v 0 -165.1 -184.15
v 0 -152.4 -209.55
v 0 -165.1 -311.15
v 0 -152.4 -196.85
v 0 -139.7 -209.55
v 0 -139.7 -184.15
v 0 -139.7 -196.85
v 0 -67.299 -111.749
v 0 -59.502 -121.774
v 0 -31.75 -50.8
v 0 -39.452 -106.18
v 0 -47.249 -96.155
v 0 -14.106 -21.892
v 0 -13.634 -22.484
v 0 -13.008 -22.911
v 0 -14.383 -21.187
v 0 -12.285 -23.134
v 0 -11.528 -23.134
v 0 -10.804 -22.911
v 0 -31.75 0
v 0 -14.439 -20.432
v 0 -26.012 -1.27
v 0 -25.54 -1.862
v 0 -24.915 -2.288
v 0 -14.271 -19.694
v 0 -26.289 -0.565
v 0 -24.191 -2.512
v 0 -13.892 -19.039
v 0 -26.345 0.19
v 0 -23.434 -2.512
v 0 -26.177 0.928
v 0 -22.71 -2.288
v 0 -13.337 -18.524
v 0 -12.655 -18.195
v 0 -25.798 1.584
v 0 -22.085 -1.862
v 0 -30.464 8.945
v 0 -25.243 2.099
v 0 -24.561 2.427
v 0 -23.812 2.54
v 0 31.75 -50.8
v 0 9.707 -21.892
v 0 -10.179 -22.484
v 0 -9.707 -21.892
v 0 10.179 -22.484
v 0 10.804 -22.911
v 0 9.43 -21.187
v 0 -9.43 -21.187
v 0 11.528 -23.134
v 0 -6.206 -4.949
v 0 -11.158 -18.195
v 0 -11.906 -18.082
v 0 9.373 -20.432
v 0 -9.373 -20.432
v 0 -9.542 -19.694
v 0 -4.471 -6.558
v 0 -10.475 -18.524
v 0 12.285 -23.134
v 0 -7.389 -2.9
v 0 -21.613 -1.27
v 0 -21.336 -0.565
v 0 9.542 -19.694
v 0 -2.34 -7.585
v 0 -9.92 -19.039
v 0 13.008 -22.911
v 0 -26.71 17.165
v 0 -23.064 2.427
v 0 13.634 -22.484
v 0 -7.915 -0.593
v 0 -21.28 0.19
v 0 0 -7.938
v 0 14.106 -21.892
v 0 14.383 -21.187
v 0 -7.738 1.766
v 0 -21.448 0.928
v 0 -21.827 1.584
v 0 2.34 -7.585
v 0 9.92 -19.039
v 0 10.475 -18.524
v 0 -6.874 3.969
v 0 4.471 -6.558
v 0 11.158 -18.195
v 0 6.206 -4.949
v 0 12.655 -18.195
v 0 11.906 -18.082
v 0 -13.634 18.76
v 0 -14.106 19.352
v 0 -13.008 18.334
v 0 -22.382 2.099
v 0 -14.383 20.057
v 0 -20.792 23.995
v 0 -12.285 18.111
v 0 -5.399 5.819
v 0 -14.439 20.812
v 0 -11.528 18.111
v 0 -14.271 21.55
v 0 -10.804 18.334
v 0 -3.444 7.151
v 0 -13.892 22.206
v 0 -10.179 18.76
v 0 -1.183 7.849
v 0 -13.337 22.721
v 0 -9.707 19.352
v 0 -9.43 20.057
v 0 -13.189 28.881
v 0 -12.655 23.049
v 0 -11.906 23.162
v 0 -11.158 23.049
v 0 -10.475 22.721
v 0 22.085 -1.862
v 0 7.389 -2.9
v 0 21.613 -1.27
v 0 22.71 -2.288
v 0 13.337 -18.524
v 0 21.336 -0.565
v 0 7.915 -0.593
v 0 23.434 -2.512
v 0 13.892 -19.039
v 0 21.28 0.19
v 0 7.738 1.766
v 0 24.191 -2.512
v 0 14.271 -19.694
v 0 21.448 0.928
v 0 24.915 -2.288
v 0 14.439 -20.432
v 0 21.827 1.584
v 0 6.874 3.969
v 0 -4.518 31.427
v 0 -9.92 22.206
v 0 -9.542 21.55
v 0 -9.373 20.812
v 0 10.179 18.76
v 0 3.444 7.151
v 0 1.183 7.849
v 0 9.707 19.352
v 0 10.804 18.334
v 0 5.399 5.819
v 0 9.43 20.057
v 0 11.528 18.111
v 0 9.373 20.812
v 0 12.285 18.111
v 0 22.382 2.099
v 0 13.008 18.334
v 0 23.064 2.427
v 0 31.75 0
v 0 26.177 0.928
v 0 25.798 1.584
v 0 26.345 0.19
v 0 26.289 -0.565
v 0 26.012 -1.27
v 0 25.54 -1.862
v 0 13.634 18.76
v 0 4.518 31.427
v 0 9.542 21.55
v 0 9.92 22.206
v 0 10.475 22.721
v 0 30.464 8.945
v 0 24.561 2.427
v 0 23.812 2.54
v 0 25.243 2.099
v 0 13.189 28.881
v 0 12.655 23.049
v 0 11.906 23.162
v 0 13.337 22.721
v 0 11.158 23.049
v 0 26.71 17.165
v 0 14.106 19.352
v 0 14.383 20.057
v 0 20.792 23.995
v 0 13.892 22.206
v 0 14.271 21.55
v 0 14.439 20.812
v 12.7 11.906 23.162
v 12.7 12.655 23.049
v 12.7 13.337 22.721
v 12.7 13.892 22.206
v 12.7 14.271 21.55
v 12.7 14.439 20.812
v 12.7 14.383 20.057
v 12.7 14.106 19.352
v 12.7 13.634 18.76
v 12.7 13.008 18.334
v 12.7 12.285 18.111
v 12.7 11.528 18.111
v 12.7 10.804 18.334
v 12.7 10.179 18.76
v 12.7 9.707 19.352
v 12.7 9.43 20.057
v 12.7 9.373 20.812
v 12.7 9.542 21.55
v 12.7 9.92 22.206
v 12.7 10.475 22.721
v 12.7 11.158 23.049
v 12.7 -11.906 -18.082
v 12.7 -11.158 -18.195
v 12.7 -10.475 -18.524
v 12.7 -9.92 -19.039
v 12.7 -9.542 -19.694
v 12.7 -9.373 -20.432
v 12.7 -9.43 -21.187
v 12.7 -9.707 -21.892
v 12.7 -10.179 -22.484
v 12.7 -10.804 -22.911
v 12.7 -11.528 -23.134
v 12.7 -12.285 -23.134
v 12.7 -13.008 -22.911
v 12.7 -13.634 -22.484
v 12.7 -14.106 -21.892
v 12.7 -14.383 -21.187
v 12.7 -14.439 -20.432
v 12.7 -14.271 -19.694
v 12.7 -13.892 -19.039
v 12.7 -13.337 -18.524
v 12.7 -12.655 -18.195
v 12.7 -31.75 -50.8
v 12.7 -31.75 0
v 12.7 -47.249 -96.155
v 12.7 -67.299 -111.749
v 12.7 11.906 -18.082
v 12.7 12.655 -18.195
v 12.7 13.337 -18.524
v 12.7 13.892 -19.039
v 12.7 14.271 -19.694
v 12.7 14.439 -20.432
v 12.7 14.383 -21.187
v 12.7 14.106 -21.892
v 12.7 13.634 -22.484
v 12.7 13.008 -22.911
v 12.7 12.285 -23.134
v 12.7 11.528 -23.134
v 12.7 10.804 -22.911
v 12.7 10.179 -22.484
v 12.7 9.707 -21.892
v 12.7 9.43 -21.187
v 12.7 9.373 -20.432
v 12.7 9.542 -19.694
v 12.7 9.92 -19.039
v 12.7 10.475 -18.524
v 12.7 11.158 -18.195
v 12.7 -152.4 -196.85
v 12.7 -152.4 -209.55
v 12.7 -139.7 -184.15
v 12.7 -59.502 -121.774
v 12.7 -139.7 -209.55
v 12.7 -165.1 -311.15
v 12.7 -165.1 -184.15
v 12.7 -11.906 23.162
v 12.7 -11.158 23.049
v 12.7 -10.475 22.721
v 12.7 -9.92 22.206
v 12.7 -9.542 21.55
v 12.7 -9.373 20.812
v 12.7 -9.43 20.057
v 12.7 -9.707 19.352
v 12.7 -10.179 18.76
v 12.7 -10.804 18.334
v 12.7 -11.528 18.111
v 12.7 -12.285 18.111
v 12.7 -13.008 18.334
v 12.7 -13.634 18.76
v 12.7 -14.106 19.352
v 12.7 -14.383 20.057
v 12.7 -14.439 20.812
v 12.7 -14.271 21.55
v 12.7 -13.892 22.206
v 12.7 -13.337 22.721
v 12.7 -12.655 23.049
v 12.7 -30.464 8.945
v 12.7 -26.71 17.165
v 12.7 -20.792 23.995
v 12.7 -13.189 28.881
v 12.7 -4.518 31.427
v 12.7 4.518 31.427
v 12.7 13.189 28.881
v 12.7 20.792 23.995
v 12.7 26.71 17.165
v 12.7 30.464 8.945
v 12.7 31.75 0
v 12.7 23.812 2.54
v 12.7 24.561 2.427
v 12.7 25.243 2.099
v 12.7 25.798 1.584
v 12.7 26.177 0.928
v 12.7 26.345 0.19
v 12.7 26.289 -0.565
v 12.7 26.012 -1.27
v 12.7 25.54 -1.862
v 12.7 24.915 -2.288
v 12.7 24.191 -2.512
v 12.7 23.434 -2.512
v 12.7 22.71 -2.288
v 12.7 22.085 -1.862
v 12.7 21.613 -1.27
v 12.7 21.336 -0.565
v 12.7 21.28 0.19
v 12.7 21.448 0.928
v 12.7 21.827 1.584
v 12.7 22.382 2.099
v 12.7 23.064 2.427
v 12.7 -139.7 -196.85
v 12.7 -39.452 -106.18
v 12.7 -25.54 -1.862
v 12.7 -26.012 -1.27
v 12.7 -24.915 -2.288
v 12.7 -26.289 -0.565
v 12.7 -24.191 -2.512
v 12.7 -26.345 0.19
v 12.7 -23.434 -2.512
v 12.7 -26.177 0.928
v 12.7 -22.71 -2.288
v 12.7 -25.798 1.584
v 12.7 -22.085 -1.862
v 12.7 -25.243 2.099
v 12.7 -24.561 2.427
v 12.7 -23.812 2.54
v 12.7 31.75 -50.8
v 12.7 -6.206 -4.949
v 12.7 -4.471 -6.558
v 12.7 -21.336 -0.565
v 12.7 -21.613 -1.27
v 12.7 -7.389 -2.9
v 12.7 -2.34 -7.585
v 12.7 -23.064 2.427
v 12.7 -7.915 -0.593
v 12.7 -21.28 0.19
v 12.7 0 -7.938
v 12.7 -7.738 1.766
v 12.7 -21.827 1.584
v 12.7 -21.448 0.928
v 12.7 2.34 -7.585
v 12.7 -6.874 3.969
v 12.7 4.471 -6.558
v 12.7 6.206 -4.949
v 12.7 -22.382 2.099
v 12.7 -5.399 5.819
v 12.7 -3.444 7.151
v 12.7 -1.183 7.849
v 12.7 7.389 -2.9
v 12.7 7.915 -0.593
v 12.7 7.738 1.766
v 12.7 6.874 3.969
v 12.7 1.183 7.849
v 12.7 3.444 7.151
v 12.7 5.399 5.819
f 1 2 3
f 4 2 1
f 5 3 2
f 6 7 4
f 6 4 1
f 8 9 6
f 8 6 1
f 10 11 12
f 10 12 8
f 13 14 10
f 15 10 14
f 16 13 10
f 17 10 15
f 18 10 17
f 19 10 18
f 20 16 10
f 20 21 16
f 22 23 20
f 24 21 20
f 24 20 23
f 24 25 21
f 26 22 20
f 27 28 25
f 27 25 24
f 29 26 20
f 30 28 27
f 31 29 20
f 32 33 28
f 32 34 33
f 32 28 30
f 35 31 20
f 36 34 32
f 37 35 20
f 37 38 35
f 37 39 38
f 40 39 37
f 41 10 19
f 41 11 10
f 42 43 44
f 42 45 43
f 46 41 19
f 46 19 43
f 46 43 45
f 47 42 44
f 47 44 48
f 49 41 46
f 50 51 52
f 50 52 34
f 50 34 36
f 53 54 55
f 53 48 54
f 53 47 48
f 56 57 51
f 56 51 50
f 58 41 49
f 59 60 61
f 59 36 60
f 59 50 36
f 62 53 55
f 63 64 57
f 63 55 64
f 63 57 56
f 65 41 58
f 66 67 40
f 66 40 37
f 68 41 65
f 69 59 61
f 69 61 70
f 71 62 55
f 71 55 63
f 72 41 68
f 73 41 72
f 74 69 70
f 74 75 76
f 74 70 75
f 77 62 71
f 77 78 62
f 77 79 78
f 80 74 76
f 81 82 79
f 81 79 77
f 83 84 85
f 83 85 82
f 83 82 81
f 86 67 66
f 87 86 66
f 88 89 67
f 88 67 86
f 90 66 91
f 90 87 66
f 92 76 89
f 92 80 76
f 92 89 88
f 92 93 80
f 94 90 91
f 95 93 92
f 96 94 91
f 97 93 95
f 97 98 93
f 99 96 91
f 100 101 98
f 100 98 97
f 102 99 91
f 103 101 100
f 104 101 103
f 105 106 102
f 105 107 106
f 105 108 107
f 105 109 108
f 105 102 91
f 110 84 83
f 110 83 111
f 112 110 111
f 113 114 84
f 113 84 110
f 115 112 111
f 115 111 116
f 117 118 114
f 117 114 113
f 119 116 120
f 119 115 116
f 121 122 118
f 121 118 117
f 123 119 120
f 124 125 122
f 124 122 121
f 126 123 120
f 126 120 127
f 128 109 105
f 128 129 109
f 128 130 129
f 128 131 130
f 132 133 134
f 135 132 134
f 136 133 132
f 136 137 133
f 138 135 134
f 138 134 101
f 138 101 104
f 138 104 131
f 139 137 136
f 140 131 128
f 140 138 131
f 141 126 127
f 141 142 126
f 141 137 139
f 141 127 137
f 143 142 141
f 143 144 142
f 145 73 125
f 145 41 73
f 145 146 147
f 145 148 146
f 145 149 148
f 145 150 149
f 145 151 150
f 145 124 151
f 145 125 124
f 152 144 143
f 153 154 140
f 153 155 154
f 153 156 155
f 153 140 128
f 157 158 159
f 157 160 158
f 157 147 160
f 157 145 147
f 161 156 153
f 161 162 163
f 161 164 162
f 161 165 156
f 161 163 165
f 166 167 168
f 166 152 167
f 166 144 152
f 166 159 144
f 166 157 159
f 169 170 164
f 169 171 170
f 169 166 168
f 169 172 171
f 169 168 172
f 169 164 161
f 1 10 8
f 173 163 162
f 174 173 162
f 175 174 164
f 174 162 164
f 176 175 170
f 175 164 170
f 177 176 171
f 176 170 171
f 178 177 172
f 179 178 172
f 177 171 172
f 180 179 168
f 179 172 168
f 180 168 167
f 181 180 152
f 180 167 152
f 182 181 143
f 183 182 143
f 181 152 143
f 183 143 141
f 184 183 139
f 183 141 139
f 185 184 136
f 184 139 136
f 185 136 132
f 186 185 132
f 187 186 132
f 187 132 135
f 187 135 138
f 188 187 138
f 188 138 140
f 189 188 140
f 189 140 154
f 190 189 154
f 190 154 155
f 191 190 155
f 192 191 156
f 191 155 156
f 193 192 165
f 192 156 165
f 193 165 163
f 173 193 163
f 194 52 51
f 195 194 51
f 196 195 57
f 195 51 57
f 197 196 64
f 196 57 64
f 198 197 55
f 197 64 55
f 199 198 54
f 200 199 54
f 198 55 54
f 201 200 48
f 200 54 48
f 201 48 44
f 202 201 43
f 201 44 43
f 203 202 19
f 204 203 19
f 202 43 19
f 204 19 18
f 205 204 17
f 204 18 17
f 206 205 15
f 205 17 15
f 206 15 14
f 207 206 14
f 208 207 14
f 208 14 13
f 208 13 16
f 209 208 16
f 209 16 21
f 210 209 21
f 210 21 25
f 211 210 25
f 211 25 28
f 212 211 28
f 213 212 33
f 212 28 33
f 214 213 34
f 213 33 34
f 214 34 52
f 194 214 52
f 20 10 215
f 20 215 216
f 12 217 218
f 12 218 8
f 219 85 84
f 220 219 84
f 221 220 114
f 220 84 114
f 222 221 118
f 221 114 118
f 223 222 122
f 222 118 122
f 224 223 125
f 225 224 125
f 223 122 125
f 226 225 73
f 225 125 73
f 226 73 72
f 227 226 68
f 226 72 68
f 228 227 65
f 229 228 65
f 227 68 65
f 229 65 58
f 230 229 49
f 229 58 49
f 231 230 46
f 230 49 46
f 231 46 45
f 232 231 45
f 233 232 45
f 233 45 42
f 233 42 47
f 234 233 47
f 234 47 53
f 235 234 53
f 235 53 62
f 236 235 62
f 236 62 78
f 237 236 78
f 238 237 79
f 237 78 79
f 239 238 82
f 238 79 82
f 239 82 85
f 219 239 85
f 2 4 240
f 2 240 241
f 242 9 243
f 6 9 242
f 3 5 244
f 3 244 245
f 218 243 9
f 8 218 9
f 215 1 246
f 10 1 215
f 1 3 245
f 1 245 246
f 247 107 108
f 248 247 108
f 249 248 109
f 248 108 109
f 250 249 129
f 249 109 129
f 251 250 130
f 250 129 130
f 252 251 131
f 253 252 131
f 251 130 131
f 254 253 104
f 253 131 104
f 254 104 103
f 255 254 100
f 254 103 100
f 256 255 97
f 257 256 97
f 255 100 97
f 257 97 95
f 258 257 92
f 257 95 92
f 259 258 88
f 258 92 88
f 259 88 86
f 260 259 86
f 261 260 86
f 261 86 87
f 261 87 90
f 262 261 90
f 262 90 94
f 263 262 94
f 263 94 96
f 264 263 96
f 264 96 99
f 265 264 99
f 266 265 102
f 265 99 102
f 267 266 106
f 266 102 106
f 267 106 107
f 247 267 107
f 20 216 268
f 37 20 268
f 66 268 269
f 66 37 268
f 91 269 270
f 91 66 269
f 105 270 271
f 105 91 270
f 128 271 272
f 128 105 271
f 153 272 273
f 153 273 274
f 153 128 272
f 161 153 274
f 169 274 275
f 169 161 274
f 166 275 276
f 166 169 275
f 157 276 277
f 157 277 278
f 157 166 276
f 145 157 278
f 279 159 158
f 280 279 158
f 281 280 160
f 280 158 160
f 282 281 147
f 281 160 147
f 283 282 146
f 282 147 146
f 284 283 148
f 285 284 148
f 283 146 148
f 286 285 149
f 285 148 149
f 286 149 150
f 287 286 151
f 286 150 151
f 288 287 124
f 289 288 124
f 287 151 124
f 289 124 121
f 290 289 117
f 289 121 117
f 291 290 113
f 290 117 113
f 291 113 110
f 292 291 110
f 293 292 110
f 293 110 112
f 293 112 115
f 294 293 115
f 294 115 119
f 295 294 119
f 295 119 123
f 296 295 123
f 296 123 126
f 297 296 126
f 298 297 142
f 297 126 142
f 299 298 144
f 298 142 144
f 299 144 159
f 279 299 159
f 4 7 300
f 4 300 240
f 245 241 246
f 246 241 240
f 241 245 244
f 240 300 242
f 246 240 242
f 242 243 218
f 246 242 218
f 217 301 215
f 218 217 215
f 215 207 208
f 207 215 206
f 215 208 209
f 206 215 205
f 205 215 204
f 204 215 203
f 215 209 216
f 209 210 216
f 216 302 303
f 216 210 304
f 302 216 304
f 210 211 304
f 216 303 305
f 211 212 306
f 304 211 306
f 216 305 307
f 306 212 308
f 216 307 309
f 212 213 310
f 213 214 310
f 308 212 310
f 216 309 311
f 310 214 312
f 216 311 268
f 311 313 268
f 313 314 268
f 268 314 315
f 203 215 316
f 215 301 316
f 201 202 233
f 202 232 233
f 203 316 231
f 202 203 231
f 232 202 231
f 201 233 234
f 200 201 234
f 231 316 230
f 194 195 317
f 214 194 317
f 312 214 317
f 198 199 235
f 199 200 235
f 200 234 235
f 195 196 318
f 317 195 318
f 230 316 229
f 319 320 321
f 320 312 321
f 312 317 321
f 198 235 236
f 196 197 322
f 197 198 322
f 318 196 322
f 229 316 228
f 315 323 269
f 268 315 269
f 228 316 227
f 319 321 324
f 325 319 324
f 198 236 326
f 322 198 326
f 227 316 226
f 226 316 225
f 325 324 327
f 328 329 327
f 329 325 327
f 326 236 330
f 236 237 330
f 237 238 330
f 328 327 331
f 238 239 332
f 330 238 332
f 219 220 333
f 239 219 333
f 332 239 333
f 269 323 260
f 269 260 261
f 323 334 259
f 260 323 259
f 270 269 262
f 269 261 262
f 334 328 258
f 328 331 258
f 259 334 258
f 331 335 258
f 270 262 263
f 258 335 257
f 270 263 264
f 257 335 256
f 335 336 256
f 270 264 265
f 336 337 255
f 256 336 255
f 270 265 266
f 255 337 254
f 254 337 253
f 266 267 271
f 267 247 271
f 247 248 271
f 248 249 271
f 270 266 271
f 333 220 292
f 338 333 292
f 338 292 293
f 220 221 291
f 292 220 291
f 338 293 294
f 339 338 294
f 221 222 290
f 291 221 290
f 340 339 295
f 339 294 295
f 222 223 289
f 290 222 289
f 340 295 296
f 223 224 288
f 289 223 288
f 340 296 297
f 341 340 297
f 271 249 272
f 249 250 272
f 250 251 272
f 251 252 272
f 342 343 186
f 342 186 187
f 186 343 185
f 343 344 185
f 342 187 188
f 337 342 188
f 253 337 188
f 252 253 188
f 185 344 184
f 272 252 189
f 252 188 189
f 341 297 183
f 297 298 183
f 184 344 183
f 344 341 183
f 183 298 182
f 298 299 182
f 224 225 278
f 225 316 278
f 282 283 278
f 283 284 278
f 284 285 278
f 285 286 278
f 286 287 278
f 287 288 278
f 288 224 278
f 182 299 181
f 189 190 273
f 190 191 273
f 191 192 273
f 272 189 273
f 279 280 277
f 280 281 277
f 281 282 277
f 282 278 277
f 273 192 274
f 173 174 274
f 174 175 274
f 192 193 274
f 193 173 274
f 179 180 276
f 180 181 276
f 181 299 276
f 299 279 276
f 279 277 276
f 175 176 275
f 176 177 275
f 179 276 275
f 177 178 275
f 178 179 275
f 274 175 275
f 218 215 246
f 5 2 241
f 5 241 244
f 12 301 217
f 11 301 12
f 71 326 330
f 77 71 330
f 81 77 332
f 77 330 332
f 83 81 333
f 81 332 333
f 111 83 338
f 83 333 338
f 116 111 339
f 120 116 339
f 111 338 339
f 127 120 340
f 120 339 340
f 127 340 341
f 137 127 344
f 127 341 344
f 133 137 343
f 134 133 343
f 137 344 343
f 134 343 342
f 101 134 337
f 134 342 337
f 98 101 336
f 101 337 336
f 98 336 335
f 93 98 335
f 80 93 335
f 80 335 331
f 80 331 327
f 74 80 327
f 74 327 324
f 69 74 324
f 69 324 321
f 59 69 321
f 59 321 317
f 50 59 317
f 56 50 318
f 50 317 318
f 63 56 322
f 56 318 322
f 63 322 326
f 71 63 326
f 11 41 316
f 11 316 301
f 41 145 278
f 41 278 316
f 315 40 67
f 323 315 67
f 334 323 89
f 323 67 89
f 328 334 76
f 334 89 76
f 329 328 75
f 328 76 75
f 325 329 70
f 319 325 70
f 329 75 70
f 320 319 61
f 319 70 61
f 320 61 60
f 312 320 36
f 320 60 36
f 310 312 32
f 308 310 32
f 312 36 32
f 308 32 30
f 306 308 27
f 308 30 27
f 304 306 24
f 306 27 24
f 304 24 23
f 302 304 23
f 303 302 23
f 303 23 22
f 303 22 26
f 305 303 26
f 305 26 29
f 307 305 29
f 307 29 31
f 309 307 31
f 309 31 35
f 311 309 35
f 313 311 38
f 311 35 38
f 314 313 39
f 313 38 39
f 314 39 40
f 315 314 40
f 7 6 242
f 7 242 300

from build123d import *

# Parameters (mm, degrees)
MAIN_DEPTH    = 12.7
SKETCH2_R     = 7.9375
AXLE_DEPTH    = 12.7
SKETCH5_W     = 12.7
SKETCH5_H     = 25.4
BARWIDE_DEPTH = 12.7
SKETCH6_R     = 2.54
SCREWS_DEPTH  = 12.7


with BuildPart() as part:
    # Sketch1 → main (new body)
    with BuildSketch(Plane(origin=(0, 0, 0), x_dir=(0, 0, -1), z_dir=(1, 0, 0))):
        with BuildLine():
            Line((0, 31.75), (50.8, 31.75))
            Line((50.8, 31.75), (184.15, -139.7))
            Line((184.15, -139.7), (196.85, -139.7))
            Line((196.85, -139.7), (196.85, -152.4))
            Line((196.85, -152.4), (209.55, -152.4))
            Line((209.55, -152.4), (209.55, -139.7))
            Line((209.55, -139.7), (311.15, -165.1))
            Line((311.15, -165.1), (184.15, -165.1))
            Line((184.15, -165.1), (50.8, -31.75))
            Line((50.8, -31.75), (0, -31.75))
            ThreePointArc((0, -31.75), (-31.75, 0), (0, 31.75))
        make_face()
    extrude(amount=MAIN_DEPTH)

    # Sketch2 → axle (cut)
    with BuildSketch(Plane(origin=(12.7, 0, 0), x_dir=(0, 0, -1), z_dir=(1, 0, 0))):
        Circle(SKETCH2_R)
    extrude(amount=-AXLE_DEPTH, mode=Mode.SUBTRACT)

    # Sketch5 → barwide (cut)
    with BuildSketch(Plane(origin=(0, 36.585769231, -47.038846154), x_dir=(-1, 0, 0), z_dir=(0, 0.6139406135149222, -0.789352217376325))):
        with Locations((-6.35, -109.029668746)):
            Rectangle(SKETCH5_W, SKETCH5_H)
    extrude(amount=-BARWIDE_DEPTH, mode=Mode.SUBTRACT)

    # Sketch6 → screws (cut)
    with BuildSketch(Plane.ZY):
        with Locations((0, 23.8125)):
            Circle(SKETCH6_R)
        with Locations((20.622229928, 11.90625)):
            Circle(SKETCH6_R)
        with Locations((20.622229928, -11.90625)):
            Circle(SKETCH6_R)
        with Locations((0, -23.8125)):
            Circle(SKETCH6_R)
        with Locations((-20.622229928, -11.90625)):
            Circle(SKETCH6_R)
        with Locations((-20.622229928, 11.90625)):
            Circle(SKETCH6_R)
    extrude(amount=-SCREWS_DEPTH, mode=Mode.SUBTRACT)


solid = part.part
